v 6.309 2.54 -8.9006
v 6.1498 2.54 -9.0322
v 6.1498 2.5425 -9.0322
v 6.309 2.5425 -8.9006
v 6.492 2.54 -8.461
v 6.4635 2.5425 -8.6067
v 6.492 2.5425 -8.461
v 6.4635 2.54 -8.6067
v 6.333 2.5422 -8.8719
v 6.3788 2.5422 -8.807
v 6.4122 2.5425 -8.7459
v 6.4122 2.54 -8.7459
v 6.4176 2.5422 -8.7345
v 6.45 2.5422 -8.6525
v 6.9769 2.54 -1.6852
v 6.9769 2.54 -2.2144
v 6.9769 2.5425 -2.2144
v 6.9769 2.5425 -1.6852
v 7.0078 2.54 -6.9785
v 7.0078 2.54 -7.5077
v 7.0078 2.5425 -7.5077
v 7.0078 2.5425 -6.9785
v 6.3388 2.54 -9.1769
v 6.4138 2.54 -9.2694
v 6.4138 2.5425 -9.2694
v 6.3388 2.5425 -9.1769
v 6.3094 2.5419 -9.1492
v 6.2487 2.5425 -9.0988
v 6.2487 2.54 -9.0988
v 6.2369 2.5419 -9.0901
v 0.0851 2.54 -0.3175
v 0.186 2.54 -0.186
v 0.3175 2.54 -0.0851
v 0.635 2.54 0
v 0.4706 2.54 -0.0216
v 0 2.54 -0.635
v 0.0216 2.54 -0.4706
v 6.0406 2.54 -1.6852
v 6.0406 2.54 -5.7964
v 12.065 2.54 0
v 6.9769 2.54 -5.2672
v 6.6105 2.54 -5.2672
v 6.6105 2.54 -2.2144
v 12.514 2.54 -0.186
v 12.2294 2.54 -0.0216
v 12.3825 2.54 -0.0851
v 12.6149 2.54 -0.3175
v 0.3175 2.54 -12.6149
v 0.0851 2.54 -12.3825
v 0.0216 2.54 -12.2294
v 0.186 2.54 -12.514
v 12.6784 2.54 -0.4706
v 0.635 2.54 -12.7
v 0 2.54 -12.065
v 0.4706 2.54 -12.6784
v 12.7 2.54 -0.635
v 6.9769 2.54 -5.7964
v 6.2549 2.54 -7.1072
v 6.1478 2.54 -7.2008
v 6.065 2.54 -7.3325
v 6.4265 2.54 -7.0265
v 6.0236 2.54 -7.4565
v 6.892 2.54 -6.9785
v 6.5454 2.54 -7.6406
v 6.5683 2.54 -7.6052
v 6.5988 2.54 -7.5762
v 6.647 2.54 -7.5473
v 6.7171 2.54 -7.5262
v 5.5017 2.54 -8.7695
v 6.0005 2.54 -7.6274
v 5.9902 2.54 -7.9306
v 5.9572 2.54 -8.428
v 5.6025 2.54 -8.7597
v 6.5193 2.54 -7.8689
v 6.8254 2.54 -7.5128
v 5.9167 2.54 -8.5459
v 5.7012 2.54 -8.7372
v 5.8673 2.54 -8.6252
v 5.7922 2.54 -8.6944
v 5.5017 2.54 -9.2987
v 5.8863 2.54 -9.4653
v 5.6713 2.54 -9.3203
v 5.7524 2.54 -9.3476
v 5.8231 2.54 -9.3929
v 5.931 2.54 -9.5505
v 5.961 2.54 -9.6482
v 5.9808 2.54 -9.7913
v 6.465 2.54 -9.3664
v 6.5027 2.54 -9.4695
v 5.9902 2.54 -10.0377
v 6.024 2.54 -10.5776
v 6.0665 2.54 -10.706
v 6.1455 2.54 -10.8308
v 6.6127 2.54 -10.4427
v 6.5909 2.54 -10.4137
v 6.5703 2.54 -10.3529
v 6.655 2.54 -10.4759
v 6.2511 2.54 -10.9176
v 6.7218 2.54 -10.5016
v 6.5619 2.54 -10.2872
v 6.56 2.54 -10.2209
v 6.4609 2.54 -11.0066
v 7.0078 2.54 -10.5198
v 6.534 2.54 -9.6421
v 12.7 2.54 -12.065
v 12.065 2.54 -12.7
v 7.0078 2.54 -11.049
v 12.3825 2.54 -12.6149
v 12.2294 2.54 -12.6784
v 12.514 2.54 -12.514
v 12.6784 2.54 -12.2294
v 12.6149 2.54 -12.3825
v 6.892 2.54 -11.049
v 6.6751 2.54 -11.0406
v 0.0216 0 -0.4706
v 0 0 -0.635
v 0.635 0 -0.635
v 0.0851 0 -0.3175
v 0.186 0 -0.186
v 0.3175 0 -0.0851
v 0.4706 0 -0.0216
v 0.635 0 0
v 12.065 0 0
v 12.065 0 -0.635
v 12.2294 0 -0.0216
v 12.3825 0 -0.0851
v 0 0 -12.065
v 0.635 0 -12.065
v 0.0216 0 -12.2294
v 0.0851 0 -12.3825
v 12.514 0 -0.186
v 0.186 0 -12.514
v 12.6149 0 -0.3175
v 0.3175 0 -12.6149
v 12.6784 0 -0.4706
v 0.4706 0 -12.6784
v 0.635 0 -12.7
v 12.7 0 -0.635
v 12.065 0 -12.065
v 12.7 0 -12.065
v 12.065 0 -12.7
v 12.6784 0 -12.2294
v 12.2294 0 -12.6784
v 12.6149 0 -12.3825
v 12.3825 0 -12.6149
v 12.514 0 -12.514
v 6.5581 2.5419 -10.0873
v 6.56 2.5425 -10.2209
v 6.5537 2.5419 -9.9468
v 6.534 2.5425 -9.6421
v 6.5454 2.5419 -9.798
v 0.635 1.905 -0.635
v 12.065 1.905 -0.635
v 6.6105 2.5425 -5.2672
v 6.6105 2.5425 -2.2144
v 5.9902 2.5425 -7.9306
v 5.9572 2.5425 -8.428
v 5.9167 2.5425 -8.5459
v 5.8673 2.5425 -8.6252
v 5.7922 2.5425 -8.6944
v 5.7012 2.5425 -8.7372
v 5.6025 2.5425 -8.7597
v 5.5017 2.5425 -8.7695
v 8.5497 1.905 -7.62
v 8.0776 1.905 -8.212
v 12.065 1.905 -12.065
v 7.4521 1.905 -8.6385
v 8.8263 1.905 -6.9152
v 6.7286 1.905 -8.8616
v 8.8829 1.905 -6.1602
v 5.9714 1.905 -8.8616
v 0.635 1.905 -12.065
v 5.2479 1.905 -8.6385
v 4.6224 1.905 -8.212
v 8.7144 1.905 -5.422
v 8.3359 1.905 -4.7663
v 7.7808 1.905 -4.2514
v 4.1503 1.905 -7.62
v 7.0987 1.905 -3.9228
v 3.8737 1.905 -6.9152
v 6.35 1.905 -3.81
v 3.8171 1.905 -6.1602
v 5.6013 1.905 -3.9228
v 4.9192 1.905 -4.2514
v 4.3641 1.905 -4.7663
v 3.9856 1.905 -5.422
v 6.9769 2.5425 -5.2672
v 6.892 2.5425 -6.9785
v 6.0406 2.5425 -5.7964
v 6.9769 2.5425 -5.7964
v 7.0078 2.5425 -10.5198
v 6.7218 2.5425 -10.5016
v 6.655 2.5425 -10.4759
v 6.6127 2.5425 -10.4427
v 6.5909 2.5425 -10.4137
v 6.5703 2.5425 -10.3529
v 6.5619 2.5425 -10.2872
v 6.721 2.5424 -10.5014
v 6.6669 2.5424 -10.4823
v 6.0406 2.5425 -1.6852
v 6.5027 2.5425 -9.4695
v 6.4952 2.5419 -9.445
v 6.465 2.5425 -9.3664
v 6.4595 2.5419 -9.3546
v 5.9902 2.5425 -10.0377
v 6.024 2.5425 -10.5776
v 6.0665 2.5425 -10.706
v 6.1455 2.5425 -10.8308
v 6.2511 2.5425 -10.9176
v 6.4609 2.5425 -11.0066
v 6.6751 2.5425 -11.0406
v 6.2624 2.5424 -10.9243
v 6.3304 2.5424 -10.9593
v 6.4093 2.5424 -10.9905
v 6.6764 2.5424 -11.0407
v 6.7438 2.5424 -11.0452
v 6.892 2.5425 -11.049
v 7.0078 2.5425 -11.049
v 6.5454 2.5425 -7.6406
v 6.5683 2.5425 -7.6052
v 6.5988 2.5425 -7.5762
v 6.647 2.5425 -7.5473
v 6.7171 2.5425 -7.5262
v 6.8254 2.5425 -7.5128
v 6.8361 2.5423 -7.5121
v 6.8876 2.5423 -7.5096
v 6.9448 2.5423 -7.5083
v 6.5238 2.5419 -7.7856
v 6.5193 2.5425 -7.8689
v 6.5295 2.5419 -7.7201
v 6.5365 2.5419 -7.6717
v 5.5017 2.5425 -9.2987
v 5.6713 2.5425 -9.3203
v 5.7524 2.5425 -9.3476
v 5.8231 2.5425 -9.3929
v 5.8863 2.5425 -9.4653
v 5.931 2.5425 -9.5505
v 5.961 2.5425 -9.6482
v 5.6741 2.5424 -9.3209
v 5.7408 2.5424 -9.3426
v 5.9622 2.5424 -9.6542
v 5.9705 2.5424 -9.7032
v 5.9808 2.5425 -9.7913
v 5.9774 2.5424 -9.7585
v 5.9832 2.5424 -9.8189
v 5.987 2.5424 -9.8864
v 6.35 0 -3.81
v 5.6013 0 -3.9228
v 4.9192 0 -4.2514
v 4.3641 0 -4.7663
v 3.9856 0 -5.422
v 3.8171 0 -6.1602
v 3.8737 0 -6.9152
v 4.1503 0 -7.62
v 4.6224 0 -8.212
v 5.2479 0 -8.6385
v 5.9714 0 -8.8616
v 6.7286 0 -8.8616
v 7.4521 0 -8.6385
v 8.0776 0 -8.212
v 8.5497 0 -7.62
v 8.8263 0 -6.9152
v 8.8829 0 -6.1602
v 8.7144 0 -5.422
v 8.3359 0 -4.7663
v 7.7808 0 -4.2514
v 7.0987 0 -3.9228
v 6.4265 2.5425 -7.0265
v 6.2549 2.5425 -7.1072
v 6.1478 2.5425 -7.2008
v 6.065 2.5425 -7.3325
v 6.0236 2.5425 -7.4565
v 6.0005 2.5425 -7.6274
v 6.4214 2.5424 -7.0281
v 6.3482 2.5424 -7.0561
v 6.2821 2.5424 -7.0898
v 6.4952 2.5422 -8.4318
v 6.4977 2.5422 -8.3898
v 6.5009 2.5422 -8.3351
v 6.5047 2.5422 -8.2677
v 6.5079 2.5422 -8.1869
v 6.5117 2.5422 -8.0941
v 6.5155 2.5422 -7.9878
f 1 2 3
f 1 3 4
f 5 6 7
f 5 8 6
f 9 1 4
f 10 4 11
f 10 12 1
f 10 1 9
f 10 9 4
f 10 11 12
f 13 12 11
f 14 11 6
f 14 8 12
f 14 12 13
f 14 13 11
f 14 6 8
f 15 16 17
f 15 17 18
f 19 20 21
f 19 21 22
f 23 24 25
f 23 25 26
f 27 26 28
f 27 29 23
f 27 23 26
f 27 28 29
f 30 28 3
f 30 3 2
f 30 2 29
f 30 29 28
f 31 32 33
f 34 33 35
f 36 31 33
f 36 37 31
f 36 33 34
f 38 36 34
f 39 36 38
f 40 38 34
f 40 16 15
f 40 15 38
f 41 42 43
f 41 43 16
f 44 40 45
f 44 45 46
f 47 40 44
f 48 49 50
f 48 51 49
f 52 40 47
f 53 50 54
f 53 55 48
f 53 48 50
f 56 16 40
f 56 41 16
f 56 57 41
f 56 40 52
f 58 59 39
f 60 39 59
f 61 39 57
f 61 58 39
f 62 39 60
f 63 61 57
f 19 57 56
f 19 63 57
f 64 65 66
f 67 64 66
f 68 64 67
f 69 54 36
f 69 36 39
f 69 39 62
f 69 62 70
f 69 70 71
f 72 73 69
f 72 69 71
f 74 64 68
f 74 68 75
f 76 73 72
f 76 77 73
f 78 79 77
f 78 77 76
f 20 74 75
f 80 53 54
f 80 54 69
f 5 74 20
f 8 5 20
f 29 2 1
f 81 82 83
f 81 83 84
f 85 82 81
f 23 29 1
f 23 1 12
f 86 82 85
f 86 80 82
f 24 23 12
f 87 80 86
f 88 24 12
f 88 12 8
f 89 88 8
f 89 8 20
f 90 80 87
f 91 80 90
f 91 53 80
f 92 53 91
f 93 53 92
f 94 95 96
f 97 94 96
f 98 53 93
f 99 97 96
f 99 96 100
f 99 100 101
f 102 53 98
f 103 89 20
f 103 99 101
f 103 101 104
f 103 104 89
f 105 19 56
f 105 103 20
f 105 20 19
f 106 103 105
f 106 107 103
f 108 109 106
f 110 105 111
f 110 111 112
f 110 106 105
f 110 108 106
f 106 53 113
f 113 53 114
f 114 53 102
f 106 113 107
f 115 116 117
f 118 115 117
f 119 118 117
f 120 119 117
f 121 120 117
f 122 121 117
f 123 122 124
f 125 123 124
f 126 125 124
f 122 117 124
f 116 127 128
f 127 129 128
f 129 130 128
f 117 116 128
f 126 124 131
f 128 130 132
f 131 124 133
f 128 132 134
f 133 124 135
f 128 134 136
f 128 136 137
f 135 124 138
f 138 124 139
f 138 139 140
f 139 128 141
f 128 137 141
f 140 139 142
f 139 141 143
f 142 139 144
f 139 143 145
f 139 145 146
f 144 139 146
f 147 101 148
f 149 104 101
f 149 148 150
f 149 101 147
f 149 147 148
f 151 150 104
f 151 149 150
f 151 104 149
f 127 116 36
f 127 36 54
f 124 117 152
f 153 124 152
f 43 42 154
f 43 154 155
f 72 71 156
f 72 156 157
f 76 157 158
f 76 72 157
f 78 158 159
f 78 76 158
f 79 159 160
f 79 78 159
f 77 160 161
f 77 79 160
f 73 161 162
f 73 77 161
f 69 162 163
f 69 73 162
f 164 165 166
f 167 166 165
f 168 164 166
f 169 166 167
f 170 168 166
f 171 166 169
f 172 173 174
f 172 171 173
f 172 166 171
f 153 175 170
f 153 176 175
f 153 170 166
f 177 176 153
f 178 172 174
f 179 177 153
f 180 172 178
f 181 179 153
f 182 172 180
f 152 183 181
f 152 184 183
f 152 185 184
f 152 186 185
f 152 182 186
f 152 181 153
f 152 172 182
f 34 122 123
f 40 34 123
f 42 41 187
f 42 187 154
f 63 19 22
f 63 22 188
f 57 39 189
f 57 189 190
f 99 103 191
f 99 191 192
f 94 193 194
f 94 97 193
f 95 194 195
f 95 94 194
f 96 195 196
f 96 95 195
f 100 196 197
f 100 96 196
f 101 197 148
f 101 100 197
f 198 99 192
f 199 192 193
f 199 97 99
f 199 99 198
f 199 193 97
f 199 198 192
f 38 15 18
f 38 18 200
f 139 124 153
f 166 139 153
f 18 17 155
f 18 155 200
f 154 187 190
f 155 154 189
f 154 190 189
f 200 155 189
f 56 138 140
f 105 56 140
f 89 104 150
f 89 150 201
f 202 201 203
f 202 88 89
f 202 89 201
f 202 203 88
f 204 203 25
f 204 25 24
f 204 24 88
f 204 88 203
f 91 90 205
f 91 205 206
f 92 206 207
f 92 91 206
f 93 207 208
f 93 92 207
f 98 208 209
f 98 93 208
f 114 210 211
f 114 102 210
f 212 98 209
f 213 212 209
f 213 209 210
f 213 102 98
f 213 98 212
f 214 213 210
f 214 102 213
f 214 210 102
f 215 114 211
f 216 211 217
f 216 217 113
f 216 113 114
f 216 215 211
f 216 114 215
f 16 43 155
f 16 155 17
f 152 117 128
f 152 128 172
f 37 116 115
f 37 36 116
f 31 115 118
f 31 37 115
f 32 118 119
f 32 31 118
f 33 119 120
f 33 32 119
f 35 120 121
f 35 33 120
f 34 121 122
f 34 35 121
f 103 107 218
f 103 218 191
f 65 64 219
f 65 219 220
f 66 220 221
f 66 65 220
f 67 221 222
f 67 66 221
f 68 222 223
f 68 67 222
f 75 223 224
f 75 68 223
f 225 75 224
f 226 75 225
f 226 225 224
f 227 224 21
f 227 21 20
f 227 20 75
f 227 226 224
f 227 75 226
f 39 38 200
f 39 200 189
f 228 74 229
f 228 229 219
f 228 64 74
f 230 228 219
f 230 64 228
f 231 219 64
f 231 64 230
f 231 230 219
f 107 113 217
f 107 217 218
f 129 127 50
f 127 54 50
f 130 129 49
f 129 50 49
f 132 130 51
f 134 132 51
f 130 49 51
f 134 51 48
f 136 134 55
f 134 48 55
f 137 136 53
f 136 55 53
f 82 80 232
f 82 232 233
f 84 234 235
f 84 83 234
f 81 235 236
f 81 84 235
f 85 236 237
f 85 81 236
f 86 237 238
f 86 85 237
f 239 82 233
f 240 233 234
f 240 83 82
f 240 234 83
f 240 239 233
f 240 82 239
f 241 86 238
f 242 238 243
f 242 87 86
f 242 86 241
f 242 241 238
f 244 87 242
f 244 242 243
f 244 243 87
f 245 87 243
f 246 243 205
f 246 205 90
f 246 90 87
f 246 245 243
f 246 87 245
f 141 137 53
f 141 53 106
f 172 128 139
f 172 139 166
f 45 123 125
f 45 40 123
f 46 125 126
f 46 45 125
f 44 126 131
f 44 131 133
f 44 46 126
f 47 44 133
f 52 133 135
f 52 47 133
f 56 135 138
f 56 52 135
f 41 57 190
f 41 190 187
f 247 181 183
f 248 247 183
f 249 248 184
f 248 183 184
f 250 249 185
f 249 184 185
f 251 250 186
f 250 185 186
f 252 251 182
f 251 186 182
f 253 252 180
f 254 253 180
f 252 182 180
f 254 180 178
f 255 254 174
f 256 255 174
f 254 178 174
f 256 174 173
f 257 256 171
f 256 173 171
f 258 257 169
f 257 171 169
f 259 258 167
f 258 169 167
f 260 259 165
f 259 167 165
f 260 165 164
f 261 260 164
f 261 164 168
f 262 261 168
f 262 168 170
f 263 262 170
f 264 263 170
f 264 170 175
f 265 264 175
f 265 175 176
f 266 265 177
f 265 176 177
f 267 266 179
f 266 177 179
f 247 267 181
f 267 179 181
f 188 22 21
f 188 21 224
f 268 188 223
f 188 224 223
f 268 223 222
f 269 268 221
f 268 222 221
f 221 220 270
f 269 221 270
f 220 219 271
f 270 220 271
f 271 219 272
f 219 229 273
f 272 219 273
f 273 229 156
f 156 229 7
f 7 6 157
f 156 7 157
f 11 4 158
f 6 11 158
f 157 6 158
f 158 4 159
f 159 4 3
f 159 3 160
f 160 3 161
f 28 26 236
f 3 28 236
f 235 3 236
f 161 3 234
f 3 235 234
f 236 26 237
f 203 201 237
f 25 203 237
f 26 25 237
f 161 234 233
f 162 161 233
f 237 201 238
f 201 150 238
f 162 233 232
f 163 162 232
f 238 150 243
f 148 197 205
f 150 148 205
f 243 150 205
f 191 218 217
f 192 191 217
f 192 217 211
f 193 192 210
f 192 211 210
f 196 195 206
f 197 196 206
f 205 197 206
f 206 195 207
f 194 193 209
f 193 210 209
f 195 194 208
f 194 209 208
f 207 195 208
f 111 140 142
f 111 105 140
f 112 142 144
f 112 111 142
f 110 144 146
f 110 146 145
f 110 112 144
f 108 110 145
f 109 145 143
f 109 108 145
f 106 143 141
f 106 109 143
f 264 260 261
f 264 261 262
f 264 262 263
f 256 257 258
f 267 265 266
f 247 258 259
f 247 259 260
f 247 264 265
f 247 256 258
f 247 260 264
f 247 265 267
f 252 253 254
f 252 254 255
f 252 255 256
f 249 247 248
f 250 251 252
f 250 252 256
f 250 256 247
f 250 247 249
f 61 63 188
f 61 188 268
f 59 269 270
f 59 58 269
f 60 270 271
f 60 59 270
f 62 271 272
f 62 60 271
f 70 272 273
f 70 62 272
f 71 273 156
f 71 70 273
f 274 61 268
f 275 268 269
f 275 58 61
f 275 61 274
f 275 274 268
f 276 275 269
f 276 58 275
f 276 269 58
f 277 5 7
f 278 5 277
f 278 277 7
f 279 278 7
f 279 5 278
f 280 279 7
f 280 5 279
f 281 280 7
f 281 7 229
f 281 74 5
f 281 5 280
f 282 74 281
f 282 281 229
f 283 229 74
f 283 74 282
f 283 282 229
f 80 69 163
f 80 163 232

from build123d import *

# Parameters (mm, degrees)
SKETCH1_W           = 12.7
SKETCH1_H           = 12.7
BOSS_EXTRUDE1_DEPTH = 2.54
FILLET1_R           = 0.635
SHELL1_START        = 0.635
SHELL1_OUTLINE_W    = 1.905
SHELL1_OUTLINE_H    = 11.43
SHELL1_DEPTH        = 11.43
SKETCH2_R           = 2.54
BOSS_EXTRUDE2_DEPTH = 1.905
BOSS_EXTRUDE4_DEPTH = 0.00254


# Read off the part's stored shape, not the designer's step: Shell1
with BuildPart() as part:
    # Sketch1 → Boss-Extrude1 (new body)
    with BuildSketch(Plane(origin=(0, 0, 0), x_dir=(1, 0, 0), z_dir=(0, 1, 0))):
        with Locations((6.35, 6.35)):
            Rectangle(SKETCH1_W, SKETCH1_H)
    extrude(amount=BOSS_EXTRUDE1_DEPTH)

    # Fillet1
    fillet1_edges = [part.edges().sort_by_distance(p)[0] for p in [
        (0, 1.27, -12.7),
        (12.7, 1.27, -12.7),
        (12.7, 1.27, 0),
        (0, 1.27, 0),
    ]]
    fillet(fillet1_edges, radius=FILLET1_R)

    # Shell1 outline → Shell1 (cut)
    with BuildSketch(Plane.YZ.offset(SHELL1_START)):
        with Locations((0.9525, -6.35)):
            Rectangle(SHELL1_OUTLINE_W, SHELL1_OUTLINE_H)
    extrude(amount=SHELL1_DEPTH, mode=Mode.SUBTRACT)

    # Sketch2 → Boss-Extrude2 (add)
    with BuildSketch(Plane(origin=(0, 1.905, 0), x_dir=(-1, 0, 0), z_dir=(0, -1, 0))):
        with Locations(Location((-6.35, 6.35, 0), (0, 0, 270))):
            Circle(SKETCH2_R)
    extrude(amount=BOSS_EXTRUDE2_DEPTH)

    # Sketch4 → Boss-Extrude4 (add)
    with BuildSketch(Plane(origin=(0, 2.54, 0), x_dir=(1, 0, 0), z_dir=(0, 1, 0))):
        Polygon((6.040641026, 5.796410256), (6.976858974, 5.796410256), (6.976858974, 5.26724359), (6.610512821, 5.26724359), (6.610512821, 2.214358974), (6.976858974, 2.214358974), (6.976858974, 1.685192308), (6.040641026, 1.685192308), align=None)
        with BuildLine():
            Line((5.501705128, 8.769512821), (5.501705128, 9.298679487))
            add(Edge.make_bspline(
                [(5.501705128, 9.298679487), (5.532724551, 9.300577954), (5.590656774, 9.304123553), (5.670981575, 9.318580211), (5.738741024, 9.339627117), (5.795240216, 9.368692195), (5.841347316, 9.407649179), (5.880872771, 9.454311284), (5.914137334, 9.51039725), (5.937186765, 9.563561565), (5.953049789, 9.612405831), (5.963005648, 9.655837142), (5.971085115, 9.705154512), (5.97787015, 9.760121424), (5.983848589, 9.821176644), (5.987184914, 9.888028776), (5.990050912, 9.960961441), (5.990127023, 10.011439709), (5.990166667, 10.037731971)],
                knots=[0, 0, 0, 0, 1.451517752, 2.710870899, 3.804446884, 4.757414975, 5.658161607, 6.607155001, 7.602945962, 8.694545061, 9.30871163, 10.000889012, 10.774639975, 11.643541707, 12.589063004, 13.641044214, 14.771307238, 16, 16, 16, 16], degree=3))
            add(Edge.make_bspline(
                [(5.990166667, 10.037731971), (5.99027291, 10.070806168), (5.990475881, 10.133992465), (5.992430984, 10.224740262), (5.995391945, 10.307239275), (6.000125578, 10.381629312), (6.004576412, 10.448111322), (6.011928876, 10.506142904), (6.018937818, 10.556415186), (6.031654225, 10.611230568), (6.050499963, 10.67120317), (6.079363112, 10.735660672), (6.113646688, 10.792741786), (6.154613928, 10.843272465), (6.204455745, 10.88728976), (6.263366728, 10.926601221), (6.332418843, 10.96169463), (6.396939353, 10.986683085), (6.454324586, 11.005661541), (6.50346794, 11.016391589), (6.556837627, 11.026835102), (6.61501627, 11.034947693), (6.677817883, 11.041279814), (6.745295804, 11.045379799), (6.817163158, 11.049034753), (6.866593581, 11.04901181), (6.892039663, 11.049)],
                knots=[0, 0, 0, 0, 1.46534077, 2.799446828, 4.021441889, 5.122390044, 6.102149716, 6.972462297, 7.7137374, 8.349485774, 9.463459583, 10.49348432, 11.471305969, 12.40580496, 13.363708508, 14.405783216, 15.535837735, 16.788212615, 17.468477195, 18.211238595, 19.014437677, 19.877880266, 20.812520865, 21.810349341, 22.872798814, 24, 24, 24, 24], degree=3))
            Line((6.892039663, 11.049), (7.007794872, 11.049))
            Line((7.007794872, 11.049), (7.007794872, 10.519833333))
            add(Edge.make_bspline(
                [(7.007794872, 10.519833333), (6.989139417, 10.519587027), (6.953312265, 10.519114005), (6.902192532, 10.51898063), (6.856196849, 10.516761047), (6.815211942, 10.514648161), (6.779444801, 10.510463786), (6.748361679, 10.507065532), (6.722625011, 10.502147344), (6.69568576, 10.49451003), (6.667022453, 10.483581701), (6.637681703, 10.465672367), (6.612925486, 10.444240108), (6.591660898, 10.418455284), (6.577004821, 10.383512508), (6.566766404, 10.339311488), (6.560706101, 10.283818342), (6.560274859, 10.243181314), (6.560038462, 10.220905048)],
                knots=[0, 0, 0, 0, 1.386539278, 2.662800514, 3.798152769, 4.808447339, 5.711450255, 6.473580847, 7.131722202, 7.655446357, 8.553625873, 9.402064563, 10.195002251, 10.979916755, 11.86135854, 12.980969535, 14.34503827, 16, 16, 16, 16], degree=3))
            add(Edge.make_bspline(
                [(6.560038462, 10.220905048), (6.559545706, 10.176381457), (6.558534177, 10.084983372), (6.554177156, 9.943947845), (6.545761586, 9.795526586), (6.537956266, 9.694057712), (6.533961739, 9.642129006)],
                knots=[0, 0, 0, 0, 0.92200247, 1.892687869, 2.921541302, 4, 4, 4, 4], degree=3))
            add(Edge.make_bspline(
                [(6.533961739, 9.642129006), (6.530117819, 9.608277323), (6.522539172, 9.541535565), (6.497126743, 9.445069771), (6.461748345, 9.353690497), (6.429734003, 9.297479672), (6.413754407, 9.269422676)],
                knots=[0, 0, 0, 0, 1.03352617, 2.037693405, 3.020536894, 4, 4, 4, 4], degree=3))
            add(Edge.make_bspline(
                [(6.413754407, 9.269422676), (6.399275564, 9.248804803), (6.368653828, 9.205199448), (6.307860152, 9.146179587), (6.235183983, 9.086222662), (6.179303029, 9.050855916), (6.149807091, 9.032188101)],
                knots=[0, 0, 0, 0, 0.843495541, 1.78393383, 2.830282145, 4, 4, 4, 4], degree=3))
            add(Edge.make_bspline(
                [(6.149807091, 9.032188101), (6.173049633, 9.016766999), (6.218724746, 8.986462199), (6.280720945, 8.933109752), (6.333920011, 8.872989352), (6.380789418, 8.807176718), (6.419813309, 8.733359395), (6.452416847, 8.6512131), (6.476240614, 8.55922335), (6.486596694, 8.49464301), (6.491984575, 8.461044271)],
                knots=[0, 0, 0, 0, 0.968830733, 1.903899033, 2.832763283, 3.752700456, 4.705369692, 5.727457187, 6.817680861, 8, 8, 8, 8], degree=3))
            add(Edge.make_bspline(
                [(6.491984575, 8.461044271), (6.493146133, 8.451300636), (6.495967556, 8.427633362), (6.497777051, 8.385555815), (6.50116022, 8.330878989), (6.505264993, 8.263278599), (6.507854941, 8.182882253), (6.512052118, 8.089623889), (6.515713081, 7.98361332), (6.518082021, 7.908557532), (6.519333333, 7.868911859)],
                knots=[0, 0, 0, 0, 0.397118983, 0.964601375, 1.703940229, 2.615138326, 3.70595647, 4.960054814, 6.394252129, 8, 8, 8, 8], degree=3))
            add(Edge.make_bspline(
                [(6.519333333, 7.868911859), (6.520579054, 7.841114333), (6.522806566, 7.791408715), (6.528797656, 7.725746662), (6.534024869, 7.676794658), (6.54216353, 7.65090783), (6.545410056, 7.64058153)],
                knots=[0, 0, 0, 0, 1.448250494, 2.589661623, 3.437413606, 4, 4, 4, 4], degree=3))
            add(Edge.make_bspline(
                [(6.545410056, 7.64058153), (6.551354746, 7.630113272), (6.56339075, 7.608918561), (6.589875696, 7.581725399), (6.622903191, 7.55908913), (6.655245791, 7.542548203), (6.686799456, 7.533078155), (6.716248693, 7.52590647), (6.751399708, 7.520618856), (6.7918716, 7.515397976), (6.837928889, 7.51173648), (6.88946915, 7.509224277), (6.946733128, 7.508161361), (6.986806182, 7.507828294), (7.007794872, 7.507653846)],
                knots=[0, 0, 0, 0, 0.854656799, 1.730393381, 2.672957062, 3.699349592, 4.301036757, 5.015168751, 5.856653451, 6.830503664, 7.921393134, 9.14589491, 10.505131993, 12, 12, 12, 12], degree=3))
            Line((7.007794872, 7.507653846), (7.007794872, 6.978487179))
            Line((7.007794872, 6.978487179), (6.892039663, 6.978487179))
            add(Edge.make_bspline(
                [(6.892039663, 6.978487179), (6.866383077, 6.978526215), (6.816963917, 6.978601404), (6.745307814, 6.981504501), (6.678867696, 6.984758361), (6.61746922, 6.991144216), (6.561045697, 6.996538747), (6.50982297, 7.005993345), (6.463681374, 7.015763286), (6.409658587, 7.030867229), (6.349044044, 7.054494053), (6.282121034, 7.08767088), (6.223475812, 7.128634915), (6.170084284, 7.173473086), (6.125792724, 7.226665597), (6.086748214, 7.284923434), (6.056128199, 7.350373385), (6.035010547, 7.409747118), (6.021564816, 7.462998966), (6.01394496, 7.510317213), (6.005784949, 7.563862295), (6.000793847, 7.624440305), (5.995228131, 7.691595022), (5.992493569, 7.765435518), (5.990466407, 7.845791113), (5.990269319, 7.901558967), (5.990166667, 7.930605569)],
                knots=[0, 0, 0, 0, 1.180076656, 2.27303809, 3.298707054, 4.239039526, 5.112461827, 5.904507711, 6.633329935, 7.281697308, 8.48250633, 9.620862782, 10.708284457, 11.766090354, 12.817538401, 13.88054636, 14.984116166, 16.131501886, 16.774862487, 17.507589143, 18.335104889, 19.265728017, 20.302418806, 21.434743744, 22.663890185, 24, 24, 24, 24], degree=3))
            add(Edge.make_bspline(
                [(5.990166667, 7.930605569), (5.990037977, 7.963042723), (5.989792348, 8.02495516), (5.988132762, 8.113818002), (5.98420043, 8.194387809), (5.979333537, 8.266723087), (5.972920121, 8.330771786), (5.965735187, 8.386687047), (5.95627693, 8.434472879), (5.942293856, 8.486214809), (5.920195452, 8.541572567), (5.888317363, 8.600377736), (5.848148398, 8.649211105), (5.801607935, 8.690417629), (5.744582017, 8.723334024), (5.67496369, 8.746517187), (5.592703317, 8.763035254), (5.533381357, 8.767257997), (5.501705128, 8.769512821)],
                knots=[0, 0, 0, 0, 1.386030809, 2.645501613, 3.797256415, 4.832502903, 5.742904192, 6.547458989, 7.240326361, 7.822704252, 8.835390849, 9.780379381, 10.668884048, 11.522772015, 12.423932252, 13.461079439, 14.644289055, 16, 16, 16, 16], degree=3))
        make_face()
    extrude(amount=BOSS_EXTRUDE4_DEPTH)


solid = part.part
